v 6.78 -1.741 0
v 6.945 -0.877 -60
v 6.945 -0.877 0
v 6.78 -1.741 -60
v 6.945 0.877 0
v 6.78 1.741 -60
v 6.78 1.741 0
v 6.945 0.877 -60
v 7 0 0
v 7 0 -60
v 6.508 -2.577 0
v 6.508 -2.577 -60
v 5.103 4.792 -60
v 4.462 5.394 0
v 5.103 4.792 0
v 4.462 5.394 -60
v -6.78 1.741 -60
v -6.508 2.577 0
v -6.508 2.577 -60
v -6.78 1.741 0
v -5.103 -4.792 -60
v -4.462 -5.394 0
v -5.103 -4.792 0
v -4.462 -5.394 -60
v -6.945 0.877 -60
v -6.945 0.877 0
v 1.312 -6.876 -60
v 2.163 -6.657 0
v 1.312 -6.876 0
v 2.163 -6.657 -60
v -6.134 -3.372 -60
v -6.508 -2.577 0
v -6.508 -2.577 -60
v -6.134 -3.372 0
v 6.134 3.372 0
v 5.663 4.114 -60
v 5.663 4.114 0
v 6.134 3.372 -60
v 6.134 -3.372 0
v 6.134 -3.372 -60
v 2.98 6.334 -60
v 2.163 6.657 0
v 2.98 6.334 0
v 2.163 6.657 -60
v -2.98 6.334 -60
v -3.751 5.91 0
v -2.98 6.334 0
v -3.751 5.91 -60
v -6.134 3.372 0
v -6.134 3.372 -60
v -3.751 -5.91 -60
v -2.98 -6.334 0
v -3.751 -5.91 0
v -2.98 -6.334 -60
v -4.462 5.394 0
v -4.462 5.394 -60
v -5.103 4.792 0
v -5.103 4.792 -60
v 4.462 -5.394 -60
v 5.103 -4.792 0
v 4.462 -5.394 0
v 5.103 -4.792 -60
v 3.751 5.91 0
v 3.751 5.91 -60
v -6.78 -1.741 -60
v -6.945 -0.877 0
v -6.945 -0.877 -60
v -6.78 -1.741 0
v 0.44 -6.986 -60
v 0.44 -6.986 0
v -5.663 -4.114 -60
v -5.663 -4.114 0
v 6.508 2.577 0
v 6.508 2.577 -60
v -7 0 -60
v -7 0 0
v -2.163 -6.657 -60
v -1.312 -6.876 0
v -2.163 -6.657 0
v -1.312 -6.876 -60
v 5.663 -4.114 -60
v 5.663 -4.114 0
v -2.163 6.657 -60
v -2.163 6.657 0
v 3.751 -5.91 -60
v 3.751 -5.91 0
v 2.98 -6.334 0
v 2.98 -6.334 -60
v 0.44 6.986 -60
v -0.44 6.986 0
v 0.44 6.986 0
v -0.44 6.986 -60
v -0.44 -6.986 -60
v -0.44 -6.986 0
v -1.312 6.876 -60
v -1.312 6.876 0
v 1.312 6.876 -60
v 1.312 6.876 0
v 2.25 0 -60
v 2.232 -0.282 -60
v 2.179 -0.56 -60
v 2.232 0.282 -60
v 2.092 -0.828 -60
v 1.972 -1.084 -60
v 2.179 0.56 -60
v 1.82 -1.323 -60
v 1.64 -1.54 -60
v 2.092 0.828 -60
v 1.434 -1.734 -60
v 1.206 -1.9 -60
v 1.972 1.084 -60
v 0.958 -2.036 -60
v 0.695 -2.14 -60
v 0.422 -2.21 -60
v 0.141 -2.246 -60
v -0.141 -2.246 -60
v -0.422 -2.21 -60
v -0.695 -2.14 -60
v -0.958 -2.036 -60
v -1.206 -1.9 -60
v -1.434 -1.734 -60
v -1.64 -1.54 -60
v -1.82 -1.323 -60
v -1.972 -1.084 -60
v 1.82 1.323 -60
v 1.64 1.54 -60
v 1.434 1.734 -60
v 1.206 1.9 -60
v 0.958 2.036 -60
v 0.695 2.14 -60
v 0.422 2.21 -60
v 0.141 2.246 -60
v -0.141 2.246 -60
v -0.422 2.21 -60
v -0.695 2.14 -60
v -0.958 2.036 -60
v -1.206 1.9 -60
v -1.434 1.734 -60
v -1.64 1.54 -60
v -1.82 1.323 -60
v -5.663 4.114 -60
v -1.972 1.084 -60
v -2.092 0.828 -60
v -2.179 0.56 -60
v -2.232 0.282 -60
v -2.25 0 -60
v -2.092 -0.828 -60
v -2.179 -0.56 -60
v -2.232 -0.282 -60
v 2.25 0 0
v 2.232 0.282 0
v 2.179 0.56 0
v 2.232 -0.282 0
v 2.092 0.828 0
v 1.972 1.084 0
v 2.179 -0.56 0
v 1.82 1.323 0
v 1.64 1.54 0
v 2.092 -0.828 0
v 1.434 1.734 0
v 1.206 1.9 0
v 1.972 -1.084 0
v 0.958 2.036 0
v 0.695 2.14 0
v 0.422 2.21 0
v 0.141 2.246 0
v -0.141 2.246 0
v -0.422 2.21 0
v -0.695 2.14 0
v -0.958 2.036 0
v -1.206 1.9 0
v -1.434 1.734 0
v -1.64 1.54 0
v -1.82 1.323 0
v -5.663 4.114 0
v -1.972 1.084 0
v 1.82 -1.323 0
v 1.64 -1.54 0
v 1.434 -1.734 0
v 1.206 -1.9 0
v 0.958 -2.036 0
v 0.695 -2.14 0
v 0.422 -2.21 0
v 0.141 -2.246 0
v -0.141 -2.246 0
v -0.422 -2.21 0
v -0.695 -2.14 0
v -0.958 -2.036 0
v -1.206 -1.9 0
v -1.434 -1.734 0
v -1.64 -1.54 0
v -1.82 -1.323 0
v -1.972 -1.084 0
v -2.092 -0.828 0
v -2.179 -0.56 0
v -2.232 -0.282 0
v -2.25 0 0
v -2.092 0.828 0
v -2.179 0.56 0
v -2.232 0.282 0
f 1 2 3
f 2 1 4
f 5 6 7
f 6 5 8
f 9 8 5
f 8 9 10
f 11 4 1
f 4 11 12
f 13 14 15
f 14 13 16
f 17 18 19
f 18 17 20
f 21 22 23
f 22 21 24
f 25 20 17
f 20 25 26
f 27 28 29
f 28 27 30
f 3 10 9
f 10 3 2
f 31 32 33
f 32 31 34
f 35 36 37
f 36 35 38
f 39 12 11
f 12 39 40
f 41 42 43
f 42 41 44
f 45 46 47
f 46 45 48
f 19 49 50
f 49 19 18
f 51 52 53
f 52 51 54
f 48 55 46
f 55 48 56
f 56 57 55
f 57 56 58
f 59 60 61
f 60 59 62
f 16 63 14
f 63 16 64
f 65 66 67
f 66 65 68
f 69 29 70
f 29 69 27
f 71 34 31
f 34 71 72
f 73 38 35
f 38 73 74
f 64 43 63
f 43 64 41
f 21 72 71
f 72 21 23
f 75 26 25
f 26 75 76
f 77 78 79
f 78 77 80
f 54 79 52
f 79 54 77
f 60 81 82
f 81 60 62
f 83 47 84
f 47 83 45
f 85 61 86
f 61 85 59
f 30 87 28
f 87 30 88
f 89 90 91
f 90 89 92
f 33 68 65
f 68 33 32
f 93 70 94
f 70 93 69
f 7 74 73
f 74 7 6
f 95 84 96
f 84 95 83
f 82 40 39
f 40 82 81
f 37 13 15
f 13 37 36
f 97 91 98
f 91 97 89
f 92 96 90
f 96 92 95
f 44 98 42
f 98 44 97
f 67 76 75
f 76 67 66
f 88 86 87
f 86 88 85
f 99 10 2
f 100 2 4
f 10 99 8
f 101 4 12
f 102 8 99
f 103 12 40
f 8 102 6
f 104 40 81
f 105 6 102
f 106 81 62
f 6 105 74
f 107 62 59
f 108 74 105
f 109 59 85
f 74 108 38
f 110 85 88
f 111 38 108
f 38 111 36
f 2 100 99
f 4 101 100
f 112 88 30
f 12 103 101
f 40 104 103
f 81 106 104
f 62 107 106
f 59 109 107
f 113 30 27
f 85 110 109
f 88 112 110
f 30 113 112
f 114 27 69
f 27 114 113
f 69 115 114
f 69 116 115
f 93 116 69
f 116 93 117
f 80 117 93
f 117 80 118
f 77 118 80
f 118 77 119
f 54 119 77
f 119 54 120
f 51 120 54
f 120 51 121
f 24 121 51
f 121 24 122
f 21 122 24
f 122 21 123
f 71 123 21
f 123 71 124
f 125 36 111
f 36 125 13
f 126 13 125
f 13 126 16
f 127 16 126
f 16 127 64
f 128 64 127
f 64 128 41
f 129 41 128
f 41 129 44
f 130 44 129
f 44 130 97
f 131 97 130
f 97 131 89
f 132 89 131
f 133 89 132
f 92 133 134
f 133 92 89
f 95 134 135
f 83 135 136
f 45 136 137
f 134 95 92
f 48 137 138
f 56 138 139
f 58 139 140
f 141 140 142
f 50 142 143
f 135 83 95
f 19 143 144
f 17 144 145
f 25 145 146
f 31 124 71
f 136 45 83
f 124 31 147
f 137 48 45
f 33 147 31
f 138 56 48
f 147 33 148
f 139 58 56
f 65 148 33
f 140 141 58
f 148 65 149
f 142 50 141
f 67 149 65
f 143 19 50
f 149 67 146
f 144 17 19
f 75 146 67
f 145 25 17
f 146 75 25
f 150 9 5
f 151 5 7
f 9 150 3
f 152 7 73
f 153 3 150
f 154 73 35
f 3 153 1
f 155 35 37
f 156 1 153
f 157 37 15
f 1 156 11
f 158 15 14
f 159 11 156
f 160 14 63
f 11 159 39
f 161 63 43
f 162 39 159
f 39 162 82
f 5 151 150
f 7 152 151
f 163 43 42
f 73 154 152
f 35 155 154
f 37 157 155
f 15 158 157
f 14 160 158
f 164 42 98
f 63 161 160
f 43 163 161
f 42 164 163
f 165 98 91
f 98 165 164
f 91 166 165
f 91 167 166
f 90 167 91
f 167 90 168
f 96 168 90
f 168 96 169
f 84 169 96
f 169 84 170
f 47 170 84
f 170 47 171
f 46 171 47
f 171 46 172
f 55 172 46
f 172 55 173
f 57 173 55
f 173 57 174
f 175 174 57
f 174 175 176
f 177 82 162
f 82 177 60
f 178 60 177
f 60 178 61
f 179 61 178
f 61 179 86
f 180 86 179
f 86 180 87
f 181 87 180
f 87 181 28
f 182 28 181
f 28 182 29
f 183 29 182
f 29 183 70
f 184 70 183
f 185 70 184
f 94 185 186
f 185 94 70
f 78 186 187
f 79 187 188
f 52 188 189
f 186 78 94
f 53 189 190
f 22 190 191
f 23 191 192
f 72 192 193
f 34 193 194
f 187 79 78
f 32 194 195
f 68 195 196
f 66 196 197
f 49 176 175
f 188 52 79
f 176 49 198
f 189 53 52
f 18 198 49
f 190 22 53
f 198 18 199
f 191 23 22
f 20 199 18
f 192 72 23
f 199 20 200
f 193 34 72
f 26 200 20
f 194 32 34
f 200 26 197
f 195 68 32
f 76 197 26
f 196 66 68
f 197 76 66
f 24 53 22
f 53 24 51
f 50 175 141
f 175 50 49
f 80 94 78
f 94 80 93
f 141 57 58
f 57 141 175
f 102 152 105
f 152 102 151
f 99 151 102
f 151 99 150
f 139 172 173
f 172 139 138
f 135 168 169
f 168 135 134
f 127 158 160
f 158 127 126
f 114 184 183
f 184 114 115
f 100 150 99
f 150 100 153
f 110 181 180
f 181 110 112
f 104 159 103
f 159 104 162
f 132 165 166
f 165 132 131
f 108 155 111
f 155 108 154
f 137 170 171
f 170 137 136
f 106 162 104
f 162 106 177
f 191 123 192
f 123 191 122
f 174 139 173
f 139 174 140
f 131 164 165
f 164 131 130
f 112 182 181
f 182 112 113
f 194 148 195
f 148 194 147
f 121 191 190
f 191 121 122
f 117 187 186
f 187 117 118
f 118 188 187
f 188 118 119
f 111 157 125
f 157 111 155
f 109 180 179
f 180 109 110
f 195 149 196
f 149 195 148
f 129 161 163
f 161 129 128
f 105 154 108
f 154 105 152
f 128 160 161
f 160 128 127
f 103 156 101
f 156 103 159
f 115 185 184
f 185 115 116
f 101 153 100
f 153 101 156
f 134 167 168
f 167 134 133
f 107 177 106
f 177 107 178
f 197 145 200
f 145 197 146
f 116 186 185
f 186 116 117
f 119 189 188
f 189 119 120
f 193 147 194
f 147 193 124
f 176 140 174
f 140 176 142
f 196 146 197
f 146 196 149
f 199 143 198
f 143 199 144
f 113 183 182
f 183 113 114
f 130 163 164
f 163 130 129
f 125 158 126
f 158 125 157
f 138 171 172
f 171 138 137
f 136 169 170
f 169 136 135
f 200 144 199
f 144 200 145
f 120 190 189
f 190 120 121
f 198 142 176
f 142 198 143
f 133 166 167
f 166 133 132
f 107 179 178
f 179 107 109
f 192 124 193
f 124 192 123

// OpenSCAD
$fn = 50;


difference() {
	union() {
		translate(v = [0, 0, -60.0000000000]) {
			cylinder(h = 60, r = 7.0000000000);
		}
	}
	union() {
		#translate(v = [0, 0, -60]) {
			cylinder(h = 60, r = 2.2500000000);
		}
	}
}
